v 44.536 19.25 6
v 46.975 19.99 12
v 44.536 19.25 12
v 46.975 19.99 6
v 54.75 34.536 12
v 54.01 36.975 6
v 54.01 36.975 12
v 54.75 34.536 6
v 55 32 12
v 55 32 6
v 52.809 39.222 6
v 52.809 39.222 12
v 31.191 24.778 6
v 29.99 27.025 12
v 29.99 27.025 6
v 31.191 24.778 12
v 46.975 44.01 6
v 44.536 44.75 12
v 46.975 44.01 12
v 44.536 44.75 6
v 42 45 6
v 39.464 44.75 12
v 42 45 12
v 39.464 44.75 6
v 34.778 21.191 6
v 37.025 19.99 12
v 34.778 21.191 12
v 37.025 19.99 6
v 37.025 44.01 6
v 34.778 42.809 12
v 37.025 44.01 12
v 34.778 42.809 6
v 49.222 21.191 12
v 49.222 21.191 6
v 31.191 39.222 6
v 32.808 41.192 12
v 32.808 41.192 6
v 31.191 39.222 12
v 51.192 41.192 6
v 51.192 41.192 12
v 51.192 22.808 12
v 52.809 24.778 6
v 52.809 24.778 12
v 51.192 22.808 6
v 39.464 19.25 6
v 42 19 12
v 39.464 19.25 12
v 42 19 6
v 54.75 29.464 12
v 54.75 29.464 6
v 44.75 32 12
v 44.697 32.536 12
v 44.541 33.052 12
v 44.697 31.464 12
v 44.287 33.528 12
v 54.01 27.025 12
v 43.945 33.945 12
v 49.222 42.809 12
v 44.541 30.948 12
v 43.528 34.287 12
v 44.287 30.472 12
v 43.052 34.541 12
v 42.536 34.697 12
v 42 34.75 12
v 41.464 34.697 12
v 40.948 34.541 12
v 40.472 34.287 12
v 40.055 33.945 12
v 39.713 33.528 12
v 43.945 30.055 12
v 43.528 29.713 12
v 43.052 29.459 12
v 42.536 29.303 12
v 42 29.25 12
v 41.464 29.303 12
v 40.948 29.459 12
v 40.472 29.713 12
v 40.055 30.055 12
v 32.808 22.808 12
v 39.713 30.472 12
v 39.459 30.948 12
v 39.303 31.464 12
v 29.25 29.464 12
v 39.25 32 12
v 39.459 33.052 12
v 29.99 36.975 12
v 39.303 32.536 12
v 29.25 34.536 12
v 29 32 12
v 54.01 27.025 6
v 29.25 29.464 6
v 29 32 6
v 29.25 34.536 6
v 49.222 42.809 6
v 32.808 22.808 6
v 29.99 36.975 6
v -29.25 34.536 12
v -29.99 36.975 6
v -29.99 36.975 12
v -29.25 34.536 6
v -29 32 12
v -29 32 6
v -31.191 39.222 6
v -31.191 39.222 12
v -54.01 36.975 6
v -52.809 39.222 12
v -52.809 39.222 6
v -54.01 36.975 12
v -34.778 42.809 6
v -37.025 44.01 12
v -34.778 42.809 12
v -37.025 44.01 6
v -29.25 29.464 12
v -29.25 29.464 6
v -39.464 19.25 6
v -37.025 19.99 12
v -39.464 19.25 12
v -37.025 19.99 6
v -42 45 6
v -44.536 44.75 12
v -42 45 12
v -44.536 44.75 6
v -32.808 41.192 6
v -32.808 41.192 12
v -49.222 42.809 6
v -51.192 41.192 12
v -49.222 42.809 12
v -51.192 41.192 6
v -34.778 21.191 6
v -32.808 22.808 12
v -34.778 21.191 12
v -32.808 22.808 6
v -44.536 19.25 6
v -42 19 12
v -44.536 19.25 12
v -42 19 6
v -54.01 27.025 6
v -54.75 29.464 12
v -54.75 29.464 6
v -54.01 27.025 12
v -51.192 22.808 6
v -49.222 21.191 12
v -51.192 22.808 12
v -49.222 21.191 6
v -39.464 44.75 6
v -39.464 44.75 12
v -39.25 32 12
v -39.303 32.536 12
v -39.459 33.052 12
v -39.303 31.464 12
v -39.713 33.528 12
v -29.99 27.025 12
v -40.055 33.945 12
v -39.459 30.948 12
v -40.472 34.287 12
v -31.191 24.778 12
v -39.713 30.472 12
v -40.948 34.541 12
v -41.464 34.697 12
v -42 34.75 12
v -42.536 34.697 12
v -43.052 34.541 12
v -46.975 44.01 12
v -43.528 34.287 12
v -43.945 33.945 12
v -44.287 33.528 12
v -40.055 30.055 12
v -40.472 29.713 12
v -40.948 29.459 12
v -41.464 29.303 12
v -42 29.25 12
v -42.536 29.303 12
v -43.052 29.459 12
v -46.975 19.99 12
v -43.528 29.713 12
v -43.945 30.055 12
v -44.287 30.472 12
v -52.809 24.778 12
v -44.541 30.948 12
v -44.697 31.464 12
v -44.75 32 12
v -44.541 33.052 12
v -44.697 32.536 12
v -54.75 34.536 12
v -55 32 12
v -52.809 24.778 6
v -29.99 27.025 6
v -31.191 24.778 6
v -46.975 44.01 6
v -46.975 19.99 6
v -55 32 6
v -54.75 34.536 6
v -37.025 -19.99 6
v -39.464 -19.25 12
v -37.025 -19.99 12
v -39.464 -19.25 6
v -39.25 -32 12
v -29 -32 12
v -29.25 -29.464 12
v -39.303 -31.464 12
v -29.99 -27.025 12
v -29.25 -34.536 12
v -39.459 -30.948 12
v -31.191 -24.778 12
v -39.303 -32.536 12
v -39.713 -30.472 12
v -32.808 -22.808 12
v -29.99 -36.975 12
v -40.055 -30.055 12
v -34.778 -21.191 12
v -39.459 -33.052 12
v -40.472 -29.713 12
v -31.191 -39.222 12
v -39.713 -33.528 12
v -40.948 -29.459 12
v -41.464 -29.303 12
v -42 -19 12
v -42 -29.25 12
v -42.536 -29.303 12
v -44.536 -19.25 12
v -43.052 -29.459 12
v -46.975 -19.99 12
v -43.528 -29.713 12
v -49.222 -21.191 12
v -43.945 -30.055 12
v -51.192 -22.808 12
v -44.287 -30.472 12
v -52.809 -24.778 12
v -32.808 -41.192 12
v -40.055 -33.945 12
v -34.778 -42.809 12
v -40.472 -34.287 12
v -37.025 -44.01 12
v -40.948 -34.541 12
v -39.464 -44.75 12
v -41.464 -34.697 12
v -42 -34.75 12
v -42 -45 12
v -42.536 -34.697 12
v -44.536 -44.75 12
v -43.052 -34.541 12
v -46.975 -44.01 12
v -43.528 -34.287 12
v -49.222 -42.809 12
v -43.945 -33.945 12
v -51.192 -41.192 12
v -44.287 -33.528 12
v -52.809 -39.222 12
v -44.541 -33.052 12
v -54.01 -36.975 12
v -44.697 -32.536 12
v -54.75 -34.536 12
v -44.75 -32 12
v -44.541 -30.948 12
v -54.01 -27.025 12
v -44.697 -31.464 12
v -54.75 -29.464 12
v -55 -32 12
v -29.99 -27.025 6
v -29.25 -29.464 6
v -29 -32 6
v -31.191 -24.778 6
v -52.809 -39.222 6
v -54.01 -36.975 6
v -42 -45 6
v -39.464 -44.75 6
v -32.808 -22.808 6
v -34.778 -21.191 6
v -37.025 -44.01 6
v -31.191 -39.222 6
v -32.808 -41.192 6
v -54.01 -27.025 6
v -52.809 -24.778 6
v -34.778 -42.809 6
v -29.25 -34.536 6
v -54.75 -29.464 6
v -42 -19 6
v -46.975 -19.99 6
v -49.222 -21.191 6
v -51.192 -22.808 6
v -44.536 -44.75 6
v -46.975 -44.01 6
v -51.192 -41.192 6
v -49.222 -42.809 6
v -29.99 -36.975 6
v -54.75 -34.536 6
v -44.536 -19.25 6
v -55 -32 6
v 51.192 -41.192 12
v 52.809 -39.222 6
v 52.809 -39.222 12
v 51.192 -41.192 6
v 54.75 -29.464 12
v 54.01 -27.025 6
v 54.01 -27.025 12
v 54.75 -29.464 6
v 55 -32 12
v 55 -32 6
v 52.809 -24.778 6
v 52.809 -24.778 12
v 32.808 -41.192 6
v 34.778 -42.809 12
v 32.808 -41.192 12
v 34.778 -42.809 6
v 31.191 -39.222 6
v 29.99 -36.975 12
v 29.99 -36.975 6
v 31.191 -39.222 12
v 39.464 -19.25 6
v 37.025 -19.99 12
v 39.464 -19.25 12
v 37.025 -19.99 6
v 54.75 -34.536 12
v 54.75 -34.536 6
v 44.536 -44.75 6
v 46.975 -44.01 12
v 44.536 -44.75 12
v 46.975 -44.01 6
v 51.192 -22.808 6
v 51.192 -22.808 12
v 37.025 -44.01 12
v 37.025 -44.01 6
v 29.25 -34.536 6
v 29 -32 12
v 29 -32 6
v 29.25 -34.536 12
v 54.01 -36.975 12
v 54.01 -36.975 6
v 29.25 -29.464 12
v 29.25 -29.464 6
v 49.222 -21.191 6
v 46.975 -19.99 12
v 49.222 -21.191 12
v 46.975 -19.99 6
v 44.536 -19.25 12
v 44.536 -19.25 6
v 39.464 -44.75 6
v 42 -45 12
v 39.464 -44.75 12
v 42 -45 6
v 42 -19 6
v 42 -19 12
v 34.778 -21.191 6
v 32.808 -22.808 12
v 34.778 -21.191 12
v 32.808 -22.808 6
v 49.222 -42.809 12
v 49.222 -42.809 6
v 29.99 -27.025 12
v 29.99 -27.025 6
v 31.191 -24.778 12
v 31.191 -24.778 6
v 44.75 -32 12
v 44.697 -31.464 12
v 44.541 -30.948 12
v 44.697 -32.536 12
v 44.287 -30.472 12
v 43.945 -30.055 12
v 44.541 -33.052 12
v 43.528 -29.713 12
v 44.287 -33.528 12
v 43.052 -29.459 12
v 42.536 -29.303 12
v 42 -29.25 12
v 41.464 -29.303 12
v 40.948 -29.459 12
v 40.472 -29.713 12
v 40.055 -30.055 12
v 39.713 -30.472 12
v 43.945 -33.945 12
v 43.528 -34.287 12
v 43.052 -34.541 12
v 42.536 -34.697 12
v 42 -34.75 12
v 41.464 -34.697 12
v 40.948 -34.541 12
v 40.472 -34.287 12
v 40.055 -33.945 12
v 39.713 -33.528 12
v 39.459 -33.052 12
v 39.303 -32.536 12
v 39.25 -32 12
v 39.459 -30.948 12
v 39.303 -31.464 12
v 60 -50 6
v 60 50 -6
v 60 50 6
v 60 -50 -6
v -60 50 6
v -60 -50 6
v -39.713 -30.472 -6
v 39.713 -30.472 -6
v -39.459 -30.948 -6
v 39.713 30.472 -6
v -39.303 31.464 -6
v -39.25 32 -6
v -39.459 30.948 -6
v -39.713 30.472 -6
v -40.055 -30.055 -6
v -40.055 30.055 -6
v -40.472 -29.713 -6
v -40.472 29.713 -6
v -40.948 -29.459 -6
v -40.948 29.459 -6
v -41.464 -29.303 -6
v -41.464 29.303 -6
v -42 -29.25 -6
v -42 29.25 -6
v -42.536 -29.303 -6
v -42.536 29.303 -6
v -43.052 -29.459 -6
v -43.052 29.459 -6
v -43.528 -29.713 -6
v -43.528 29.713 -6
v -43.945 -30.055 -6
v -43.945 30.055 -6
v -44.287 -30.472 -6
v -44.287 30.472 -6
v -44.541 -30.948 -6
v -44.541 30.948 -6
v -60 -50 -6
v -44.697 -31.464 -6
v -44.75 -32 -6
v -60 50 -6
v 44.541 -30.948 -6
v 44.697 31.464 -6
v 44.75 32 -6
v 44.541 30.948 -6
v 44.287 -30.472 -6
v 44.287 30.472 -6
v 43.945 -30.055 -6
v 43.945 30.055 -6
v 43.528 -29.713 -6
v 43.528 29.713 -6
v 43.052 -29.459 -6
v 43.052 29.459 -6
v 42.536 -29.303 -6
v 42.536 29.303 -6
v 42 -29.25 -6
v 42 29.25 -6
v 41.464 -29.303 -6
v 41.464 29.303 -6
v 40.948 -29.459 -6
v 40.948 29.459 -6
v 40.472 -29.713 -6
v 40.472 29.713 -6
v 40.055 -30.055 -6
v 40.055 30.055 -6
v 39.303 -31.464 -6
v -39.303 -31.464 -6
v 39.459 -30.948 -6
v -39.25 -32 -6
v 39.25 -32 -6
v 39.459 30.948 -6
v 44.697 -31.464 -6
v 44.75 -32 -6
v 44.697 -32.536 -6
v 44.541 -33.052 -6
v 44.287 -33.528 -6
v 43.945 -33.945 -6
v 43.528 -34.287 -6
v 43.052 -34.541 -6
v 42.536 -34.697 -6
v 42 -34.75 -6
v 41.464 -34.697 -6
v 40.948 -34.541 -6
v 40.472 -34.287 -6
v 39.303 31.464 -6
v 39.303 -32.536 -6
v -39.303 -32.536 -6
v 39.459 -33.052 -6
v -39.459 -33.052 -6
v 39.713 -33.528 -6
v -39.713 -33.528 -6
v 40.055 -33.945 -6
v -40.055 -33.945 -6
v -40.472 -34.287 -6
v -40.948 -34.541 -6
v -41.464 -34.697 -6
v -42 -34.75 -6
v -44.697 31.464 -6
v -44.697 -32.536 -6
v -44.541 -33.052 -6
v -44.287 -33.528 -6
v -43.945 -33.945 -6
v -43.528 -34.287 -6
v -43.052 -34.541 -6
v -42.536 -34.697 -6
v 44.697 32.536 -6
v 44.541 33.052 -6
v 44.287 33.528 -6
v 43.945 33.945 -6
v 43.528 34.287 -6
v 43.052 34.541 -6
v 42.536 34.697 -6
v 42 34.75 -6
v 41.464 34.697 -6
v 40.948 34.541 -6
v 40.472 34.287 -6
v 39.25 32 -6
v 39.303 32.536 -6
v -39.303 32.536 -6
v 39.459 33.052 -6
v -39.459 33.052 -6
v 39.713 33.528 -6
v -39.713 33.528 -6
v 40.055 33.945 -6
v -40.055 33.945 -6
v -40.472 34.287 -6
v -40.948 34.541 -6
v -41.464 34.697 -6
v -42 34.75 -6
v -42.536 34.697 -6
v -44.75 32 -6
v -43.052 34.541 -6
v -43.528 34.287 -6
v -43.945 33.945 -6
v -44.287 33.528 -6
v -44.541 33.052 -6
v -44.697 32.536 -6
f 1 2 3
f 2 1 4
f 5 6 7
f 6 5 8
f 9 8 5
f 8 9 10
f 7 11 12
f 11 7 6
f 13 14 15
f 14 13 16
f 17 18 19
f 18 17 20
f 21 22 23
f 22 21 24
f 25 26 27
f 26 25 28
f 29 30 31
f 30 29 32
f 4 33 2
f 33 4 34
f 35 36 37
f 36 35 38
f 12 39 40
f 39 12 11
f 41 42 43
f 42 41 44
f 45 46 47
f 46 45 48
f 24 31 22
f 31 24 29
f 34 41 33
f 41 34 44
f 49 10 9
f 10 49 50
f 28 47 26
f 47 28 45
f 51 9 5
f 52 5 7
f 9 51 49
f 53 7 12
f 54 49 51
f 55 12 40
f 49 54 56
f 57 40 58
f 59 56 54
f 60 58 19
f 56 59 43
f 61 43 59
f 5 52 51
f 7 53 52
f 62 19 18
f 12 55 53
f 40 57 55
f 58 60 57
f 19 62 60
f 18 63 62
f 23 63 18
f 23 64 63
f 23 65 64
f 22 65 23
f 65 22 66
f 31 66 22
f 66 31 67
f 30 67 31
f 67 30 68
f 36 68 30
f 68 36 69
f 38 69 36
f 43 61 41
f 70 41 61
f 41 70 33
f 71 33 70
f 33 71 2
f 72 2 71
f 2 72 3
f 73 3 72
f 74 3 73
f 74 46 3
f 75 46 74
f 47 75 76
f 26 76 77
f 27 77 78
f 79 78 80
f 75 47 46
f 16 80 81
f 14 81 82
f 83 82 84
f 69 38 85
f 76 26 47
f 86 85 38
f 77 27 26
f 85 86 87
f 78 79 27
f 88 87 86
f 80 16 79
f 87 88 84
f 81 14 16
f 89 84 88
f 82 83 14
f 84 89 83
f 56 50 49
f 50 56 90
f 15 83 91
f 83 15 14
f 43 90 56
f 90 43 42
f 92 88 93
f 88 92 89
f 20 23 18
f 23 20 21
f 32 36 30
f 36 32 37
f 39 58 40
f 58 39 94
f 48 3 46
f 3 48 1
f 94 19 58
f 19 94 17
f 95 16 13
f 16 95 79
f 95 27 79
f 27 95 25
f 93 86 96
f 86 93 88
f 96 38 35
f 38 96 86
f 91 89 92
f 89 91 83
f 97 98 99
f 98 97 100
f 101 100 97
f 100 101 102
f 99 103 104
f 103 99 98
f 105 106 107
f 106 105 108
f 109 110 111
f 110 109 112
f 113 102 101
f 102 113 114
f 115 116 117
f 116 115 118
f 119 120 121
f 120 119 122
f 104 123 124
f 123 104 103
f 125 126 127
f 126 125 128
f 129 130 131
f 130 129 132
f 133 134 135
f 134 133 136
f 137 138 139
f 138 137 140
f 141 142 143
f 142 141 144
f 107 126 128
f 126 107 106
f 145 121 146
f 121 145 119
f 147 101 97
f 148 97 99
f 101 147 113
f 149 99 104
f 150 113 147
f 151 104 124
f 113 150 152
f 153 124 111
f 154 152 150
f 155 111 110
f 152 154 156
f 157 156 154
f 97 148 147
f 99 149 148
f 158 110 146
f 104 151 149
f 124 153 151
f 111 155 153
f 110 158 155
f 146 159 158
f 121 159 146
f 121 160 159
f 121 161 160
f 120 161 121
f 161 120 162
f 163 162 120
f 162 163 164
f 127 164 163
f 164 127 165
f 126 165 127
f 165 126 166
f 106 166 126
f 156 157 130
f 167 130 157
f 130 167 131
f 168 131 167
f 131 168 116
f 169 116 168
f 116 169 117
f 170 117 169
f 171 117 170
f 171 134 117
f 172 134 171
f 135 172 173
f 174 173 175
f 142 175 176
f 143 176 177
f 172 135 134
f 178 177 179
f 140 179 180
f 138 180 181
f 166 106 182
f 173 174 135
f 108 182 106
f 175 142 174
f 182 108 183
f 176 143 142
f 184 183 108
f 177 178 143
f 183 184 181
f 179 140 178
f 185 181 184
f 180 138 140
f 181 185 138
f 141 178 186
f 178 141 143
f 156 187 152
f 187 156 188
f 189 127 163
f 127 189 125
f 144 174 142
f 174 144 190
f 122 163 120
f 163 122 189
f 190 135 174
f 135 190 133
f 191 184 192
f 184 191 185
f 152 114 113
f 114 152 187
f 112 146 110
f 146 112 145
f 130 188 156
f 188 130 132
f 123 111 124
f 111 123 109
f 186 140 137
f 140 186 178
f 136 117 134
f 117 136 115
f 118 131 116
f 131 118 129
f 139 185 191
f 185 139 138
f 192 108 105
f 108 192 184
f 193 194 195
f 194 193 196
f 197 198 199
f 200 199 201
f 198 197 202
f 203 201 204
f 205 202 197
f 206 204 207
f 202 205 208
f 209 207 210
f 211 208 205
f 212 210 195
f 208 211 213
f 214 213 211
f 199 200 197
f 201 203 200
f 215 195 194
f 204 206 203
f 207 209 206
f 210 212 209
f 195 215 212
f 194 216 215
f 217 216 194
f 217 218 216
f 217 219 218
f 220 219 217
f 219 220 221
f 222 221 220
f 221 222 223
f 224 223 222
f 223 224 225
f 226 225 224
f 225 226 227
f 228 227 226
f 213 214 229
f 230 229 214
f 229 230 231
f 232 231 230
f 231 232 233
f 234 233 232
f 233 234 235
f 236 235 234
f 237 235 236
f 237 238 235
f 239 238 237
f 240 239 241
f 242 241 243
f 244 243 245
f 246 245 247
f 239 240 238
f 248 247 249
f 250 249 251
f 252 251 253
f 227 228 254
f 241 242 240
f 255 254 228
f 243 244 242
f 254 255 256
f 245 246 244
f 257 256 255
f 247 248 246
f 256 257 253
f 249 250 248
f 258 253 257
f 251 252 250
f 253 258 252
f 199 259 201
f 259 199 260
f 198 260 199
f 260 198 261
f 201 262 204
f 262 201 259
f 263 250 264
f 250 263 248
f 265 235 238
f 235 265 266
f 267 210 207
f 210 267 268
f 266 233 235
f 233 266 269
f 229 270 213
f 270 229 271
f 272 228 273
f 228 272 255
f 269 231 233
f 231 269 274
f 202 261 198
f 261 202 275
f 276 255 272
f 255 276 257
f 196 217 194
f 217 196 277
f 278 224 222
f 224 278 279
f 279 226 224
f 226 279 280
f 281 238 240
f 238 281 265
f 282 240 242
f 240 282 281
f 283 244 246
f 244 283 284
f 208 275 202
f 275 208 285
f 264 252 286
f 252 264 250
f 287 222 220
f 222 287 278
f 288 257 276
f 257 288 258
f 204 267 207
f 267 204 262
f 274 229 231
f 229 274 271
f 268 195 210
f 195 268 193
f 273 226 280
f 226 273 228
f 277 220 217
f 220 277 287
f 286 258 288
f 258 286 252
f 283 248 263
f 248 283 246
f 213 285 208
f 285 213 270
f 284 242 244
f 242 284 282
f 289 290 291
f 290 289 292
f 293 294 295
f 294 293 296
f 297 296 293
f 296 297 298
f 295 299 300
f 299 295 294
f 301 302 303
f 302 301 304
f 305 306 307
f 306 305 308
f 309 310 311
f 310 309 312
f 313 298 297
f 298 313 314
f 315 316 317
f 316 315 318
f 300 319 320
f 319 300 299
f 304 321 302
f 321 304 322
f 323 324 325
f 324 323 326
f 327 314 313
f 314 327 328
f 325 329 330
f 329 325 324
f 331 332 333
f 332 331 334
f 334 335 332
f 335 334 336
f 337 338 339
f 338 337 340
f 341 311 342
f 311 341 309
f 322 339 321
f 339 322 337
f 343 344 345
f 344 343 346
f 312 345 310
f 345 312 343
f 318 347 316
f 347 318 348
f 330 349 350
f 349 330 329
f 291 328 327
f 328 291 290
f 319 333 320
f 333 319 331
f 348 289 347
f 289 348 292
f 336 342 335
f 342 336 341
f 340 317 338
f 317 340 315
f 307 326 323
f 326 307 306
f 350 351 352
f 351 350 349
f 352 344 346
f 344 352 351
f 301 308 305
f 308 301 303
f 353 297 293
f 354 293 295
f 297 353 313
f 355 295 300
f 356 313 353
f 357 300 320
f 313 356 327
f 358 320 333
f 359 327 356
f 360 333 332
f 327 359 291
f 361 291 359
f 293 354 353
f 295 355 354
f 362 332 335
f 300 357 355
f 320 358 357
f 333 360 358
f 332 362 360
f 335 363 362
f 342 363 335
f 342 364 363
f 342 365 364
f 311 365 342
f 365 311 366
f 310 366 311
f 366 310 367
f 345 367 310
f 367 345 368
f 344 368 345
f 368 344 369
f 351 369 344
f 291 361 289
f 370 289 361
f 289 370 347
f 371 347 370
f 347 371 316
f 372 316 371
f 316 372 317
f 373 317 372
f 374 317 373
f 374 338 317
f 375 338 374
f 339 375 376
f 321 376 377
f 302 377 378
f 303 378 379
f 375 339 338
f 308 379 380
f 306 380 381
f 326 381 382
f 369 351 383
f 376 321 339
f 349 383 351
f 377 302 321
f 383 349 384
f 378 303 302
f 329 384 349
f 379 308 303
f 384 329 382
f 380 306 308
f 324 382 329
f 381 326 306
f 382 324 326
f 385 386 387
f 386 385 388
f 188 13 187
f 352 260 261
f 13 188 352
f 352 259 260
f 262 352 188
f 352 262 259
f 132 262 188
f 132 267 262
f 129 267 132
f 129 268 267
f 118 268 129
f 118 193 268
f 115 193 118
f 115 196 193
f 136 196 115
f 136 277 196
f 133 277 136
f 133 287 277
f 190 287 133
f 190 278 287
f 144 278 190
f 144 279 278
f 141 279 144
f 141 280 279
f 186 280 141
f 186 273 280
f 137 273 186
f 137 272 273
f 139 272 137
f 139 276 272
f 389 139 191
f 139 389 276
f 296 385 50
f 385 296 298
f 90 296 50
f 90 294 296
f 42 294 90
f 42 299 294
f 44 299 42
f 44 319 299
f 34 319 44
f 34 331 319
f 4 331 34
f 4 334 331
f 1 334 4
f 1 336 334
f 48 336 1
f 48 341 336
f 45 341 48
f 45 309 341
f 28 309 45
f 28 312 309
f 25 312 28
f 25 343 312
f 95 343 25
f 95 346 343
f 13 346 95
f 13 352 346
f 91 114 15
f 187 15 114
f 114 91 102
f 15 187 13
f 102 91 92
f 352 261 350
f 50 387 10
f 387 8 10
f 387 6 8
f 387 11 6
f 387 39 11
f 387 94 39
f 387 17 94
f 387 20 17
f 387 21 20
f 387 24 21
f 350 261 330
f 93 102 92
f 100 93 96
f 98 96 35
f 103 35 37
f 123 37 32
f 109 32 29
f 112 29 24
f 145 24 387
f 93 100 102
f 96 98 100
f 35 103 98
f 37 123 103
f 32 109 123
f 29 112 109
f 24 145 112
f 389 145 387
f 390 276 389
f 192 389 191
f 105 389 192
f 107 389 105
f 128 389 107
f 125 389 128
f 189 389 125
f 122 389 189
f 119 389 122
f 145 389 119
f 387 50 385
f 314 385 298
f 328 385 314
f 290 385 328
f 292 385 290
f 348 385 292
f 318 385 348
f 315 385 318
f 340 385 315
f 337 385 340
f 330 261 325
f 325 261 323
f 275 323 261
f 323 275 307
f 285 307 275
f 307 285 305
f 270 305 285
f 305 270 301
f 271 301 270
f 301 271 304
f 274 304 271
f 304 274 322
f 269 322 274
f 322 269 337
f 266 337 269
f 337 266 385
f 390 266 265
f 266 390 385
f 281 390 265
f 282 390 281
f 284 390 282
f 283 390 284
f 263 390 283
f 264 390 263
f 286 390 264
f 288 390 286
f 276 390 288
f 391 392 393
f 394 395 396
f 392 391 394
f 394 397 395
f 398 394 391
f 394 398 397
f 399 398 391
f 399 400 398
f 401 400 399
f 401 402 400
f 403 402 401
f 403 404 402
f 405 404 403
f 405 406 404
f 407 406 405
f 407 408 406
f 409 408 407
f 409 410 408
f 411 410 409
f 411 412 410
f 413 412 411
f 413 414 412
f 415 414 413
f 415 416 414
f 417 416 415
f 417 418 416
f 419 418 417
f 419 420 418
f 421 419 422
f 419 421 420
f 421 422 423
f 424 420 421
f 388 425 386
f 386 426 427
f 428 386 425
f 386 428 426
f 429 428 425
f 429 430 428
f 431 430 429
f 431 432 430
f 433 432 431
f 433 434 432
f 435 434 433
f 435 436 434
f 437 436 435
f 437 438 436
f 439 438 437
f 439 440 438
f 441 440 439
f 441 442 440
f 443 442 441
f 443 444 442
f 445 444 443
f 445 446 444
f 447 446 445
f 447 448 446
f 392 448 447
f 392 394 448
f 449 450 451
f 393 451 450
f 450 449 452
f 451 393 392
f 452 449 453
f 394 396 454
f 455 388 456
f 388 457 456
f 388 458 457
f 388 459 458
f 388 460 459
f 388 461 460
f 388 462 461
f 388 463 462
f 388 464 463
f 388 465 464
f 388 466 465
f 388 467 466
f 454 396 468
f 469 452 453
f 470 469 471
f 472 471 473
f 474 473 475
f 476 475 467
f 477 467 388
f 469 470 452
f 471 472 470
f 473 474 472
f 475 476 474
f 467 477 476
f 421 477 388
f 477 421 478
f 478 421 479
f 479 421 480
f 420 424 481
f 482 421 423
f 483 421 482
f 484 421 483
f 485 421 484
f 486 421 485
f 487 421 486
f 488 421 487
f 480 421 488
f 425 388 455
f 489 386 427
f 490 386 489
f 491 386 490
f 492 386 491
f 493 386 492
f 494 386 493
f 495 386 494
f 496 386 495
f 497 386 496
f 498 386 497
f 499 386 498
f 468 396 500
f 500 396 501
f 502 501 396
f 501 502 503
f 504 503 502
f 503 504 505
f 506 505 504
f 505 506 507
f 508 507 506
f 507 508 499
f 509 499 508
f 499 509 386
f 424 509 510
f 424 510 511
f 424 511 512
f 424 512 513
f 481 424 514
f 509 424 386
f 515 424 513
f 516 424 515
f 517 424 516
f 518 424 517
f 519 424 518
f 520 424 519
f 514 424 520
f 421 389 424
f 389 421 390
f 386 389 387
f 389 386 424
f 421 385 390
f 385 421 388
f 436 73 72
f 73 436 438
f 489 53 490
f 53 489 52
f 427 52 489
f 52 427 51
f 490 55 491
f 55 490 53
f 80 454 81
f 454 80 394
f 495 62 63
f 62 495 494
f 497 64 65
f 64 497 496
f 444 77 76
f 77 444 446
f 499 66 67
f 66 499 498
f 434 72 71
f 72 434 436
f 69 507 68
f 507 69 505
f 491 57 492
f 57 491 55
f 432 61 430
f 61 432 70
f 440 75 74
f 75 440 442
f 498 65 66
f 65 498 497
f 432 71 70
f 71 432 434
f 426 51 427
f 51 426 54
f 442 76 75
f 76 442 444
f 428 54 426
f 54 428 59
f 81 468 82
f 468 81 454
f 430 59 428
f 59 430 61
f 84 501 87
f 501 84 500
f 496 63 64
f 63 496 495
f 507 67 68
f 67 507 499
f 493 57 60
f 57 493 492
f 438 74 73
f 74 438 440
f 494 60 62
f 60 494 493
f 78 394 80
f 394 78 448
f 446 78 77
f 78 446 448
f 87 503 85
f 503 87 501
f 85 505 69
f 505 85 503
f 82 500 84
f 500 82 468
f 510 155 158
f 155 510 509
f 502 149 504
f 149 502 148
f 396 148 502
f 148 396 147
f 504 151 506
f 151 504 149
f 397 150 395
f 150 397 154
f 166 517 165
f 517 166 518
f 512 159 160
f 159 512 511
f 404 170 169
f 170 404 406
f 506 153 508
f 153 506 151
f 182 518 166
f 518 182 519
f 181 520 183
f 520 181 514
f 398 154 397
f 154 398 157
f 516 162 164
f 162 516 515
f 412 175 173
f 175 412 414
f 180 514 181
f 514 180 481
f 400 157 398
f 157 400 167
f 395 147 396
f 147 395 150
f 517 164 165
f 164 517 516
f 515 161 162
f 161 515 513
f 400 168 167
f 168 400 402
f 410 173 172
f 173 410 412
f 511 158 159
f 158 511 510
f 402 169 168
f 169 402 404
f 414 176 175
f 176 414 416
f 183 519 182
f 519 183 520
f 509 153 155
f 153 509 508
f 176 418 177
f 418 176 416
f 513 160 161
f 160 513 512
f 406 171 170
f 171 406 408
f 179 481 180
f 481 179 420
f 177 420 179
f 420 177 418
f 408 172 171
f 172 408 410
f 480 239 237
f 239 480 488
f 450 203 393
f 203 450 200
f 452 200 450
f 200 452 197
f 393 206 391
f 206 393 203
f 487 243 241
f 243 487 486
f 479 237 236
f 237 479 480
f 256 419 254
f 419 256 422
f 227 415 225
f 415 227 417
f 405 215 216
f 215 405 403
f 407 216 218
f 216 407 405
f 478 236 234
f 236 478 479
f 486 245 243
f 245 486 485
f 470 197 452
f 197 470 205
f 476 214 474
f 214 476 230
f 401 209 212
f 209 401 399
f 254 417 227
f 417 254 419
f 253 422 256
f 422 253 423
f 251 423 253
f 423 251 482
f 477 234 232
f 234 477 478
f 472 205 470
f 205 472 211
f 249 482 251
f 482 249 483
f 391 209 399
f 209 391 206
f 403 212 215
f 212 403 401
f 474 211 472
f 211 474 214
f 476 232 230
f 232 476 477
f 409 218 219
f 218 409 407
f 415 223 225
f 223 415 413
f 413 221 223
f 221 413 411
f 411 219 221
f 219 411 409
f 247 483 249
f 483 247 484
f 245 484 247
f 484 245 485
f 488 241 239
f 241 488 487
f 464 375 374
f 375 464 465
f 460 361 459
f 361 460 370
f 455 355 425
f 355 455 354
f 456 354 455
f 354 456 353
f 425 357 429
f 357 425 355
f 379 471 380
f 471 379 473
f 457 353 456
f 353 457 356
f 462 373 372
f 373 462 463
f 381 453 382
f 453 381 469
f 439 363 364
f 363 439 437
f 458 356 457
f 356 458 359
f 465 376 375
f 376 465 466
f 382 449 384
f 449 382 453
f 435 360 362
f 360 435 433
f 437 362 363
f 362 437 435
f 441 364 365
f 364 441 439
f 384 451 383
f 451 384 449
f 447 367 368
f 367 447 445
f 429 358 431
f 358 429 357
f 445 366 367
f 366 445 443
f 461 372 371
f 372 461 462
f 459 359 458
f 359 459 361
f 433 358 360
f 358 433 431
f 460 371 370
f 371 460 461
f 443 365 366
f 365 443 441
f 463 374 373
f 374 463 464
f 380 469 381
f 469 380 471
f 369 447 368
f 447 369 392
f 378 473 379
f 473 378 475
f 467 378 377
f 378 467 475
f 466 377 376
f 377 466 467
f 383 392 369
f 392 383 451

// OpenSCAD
$fn = 32;

// ----------------------------------------------------------------------
// Anchor pads 120 x 100 x 18
// four corner bosses with anchor holes
// ----------------------------------------------------------------------

// --- parameters (mm) ---
plate = [120, 100, 12];  // base plate size (x, y, z)
pads = 4;                // boss count, one per corner
edge = 18;               // boss centre offset from the plate edge
boss_d = 26;             // boss diameter
boss_h = 6;              // boss height above the base plate
hole_d = 5.5;            // hole diameter

// --- derived feature positions (mm) ---
height = plate[2] + boss_h;      // = 18   overall height of the part
corner_x = plate[0] / 2 - edge;  // = 42   boss centre X
corner_y = plate[1] / 2 - edge;  // = 32   boss centre Y
feature_centers = [
  [corner_x, corner_y],
  [-corner_x, corner_y],
  [-corner_x, -corner_y],
  [corner_x, -corner_y]
];   // boss centres, anchor holes are drilled there

// base plate, four bosses standing on it, anchor holes all the way through
difference() {
  union() {
    cube(plate, center = true);
    for (centre = feature_centers)
      translate([centre[0], centre[1], plate[2] / 2 - 1])
        cylinder(d = boss_d, h = boss_h + 1);
  }
  for (centre = feature_centers)
    translate([centre[0], centre[1], -height])
      cylinder(d = hole_d, h = 2 * height + 2);  // through boss and plate
}
